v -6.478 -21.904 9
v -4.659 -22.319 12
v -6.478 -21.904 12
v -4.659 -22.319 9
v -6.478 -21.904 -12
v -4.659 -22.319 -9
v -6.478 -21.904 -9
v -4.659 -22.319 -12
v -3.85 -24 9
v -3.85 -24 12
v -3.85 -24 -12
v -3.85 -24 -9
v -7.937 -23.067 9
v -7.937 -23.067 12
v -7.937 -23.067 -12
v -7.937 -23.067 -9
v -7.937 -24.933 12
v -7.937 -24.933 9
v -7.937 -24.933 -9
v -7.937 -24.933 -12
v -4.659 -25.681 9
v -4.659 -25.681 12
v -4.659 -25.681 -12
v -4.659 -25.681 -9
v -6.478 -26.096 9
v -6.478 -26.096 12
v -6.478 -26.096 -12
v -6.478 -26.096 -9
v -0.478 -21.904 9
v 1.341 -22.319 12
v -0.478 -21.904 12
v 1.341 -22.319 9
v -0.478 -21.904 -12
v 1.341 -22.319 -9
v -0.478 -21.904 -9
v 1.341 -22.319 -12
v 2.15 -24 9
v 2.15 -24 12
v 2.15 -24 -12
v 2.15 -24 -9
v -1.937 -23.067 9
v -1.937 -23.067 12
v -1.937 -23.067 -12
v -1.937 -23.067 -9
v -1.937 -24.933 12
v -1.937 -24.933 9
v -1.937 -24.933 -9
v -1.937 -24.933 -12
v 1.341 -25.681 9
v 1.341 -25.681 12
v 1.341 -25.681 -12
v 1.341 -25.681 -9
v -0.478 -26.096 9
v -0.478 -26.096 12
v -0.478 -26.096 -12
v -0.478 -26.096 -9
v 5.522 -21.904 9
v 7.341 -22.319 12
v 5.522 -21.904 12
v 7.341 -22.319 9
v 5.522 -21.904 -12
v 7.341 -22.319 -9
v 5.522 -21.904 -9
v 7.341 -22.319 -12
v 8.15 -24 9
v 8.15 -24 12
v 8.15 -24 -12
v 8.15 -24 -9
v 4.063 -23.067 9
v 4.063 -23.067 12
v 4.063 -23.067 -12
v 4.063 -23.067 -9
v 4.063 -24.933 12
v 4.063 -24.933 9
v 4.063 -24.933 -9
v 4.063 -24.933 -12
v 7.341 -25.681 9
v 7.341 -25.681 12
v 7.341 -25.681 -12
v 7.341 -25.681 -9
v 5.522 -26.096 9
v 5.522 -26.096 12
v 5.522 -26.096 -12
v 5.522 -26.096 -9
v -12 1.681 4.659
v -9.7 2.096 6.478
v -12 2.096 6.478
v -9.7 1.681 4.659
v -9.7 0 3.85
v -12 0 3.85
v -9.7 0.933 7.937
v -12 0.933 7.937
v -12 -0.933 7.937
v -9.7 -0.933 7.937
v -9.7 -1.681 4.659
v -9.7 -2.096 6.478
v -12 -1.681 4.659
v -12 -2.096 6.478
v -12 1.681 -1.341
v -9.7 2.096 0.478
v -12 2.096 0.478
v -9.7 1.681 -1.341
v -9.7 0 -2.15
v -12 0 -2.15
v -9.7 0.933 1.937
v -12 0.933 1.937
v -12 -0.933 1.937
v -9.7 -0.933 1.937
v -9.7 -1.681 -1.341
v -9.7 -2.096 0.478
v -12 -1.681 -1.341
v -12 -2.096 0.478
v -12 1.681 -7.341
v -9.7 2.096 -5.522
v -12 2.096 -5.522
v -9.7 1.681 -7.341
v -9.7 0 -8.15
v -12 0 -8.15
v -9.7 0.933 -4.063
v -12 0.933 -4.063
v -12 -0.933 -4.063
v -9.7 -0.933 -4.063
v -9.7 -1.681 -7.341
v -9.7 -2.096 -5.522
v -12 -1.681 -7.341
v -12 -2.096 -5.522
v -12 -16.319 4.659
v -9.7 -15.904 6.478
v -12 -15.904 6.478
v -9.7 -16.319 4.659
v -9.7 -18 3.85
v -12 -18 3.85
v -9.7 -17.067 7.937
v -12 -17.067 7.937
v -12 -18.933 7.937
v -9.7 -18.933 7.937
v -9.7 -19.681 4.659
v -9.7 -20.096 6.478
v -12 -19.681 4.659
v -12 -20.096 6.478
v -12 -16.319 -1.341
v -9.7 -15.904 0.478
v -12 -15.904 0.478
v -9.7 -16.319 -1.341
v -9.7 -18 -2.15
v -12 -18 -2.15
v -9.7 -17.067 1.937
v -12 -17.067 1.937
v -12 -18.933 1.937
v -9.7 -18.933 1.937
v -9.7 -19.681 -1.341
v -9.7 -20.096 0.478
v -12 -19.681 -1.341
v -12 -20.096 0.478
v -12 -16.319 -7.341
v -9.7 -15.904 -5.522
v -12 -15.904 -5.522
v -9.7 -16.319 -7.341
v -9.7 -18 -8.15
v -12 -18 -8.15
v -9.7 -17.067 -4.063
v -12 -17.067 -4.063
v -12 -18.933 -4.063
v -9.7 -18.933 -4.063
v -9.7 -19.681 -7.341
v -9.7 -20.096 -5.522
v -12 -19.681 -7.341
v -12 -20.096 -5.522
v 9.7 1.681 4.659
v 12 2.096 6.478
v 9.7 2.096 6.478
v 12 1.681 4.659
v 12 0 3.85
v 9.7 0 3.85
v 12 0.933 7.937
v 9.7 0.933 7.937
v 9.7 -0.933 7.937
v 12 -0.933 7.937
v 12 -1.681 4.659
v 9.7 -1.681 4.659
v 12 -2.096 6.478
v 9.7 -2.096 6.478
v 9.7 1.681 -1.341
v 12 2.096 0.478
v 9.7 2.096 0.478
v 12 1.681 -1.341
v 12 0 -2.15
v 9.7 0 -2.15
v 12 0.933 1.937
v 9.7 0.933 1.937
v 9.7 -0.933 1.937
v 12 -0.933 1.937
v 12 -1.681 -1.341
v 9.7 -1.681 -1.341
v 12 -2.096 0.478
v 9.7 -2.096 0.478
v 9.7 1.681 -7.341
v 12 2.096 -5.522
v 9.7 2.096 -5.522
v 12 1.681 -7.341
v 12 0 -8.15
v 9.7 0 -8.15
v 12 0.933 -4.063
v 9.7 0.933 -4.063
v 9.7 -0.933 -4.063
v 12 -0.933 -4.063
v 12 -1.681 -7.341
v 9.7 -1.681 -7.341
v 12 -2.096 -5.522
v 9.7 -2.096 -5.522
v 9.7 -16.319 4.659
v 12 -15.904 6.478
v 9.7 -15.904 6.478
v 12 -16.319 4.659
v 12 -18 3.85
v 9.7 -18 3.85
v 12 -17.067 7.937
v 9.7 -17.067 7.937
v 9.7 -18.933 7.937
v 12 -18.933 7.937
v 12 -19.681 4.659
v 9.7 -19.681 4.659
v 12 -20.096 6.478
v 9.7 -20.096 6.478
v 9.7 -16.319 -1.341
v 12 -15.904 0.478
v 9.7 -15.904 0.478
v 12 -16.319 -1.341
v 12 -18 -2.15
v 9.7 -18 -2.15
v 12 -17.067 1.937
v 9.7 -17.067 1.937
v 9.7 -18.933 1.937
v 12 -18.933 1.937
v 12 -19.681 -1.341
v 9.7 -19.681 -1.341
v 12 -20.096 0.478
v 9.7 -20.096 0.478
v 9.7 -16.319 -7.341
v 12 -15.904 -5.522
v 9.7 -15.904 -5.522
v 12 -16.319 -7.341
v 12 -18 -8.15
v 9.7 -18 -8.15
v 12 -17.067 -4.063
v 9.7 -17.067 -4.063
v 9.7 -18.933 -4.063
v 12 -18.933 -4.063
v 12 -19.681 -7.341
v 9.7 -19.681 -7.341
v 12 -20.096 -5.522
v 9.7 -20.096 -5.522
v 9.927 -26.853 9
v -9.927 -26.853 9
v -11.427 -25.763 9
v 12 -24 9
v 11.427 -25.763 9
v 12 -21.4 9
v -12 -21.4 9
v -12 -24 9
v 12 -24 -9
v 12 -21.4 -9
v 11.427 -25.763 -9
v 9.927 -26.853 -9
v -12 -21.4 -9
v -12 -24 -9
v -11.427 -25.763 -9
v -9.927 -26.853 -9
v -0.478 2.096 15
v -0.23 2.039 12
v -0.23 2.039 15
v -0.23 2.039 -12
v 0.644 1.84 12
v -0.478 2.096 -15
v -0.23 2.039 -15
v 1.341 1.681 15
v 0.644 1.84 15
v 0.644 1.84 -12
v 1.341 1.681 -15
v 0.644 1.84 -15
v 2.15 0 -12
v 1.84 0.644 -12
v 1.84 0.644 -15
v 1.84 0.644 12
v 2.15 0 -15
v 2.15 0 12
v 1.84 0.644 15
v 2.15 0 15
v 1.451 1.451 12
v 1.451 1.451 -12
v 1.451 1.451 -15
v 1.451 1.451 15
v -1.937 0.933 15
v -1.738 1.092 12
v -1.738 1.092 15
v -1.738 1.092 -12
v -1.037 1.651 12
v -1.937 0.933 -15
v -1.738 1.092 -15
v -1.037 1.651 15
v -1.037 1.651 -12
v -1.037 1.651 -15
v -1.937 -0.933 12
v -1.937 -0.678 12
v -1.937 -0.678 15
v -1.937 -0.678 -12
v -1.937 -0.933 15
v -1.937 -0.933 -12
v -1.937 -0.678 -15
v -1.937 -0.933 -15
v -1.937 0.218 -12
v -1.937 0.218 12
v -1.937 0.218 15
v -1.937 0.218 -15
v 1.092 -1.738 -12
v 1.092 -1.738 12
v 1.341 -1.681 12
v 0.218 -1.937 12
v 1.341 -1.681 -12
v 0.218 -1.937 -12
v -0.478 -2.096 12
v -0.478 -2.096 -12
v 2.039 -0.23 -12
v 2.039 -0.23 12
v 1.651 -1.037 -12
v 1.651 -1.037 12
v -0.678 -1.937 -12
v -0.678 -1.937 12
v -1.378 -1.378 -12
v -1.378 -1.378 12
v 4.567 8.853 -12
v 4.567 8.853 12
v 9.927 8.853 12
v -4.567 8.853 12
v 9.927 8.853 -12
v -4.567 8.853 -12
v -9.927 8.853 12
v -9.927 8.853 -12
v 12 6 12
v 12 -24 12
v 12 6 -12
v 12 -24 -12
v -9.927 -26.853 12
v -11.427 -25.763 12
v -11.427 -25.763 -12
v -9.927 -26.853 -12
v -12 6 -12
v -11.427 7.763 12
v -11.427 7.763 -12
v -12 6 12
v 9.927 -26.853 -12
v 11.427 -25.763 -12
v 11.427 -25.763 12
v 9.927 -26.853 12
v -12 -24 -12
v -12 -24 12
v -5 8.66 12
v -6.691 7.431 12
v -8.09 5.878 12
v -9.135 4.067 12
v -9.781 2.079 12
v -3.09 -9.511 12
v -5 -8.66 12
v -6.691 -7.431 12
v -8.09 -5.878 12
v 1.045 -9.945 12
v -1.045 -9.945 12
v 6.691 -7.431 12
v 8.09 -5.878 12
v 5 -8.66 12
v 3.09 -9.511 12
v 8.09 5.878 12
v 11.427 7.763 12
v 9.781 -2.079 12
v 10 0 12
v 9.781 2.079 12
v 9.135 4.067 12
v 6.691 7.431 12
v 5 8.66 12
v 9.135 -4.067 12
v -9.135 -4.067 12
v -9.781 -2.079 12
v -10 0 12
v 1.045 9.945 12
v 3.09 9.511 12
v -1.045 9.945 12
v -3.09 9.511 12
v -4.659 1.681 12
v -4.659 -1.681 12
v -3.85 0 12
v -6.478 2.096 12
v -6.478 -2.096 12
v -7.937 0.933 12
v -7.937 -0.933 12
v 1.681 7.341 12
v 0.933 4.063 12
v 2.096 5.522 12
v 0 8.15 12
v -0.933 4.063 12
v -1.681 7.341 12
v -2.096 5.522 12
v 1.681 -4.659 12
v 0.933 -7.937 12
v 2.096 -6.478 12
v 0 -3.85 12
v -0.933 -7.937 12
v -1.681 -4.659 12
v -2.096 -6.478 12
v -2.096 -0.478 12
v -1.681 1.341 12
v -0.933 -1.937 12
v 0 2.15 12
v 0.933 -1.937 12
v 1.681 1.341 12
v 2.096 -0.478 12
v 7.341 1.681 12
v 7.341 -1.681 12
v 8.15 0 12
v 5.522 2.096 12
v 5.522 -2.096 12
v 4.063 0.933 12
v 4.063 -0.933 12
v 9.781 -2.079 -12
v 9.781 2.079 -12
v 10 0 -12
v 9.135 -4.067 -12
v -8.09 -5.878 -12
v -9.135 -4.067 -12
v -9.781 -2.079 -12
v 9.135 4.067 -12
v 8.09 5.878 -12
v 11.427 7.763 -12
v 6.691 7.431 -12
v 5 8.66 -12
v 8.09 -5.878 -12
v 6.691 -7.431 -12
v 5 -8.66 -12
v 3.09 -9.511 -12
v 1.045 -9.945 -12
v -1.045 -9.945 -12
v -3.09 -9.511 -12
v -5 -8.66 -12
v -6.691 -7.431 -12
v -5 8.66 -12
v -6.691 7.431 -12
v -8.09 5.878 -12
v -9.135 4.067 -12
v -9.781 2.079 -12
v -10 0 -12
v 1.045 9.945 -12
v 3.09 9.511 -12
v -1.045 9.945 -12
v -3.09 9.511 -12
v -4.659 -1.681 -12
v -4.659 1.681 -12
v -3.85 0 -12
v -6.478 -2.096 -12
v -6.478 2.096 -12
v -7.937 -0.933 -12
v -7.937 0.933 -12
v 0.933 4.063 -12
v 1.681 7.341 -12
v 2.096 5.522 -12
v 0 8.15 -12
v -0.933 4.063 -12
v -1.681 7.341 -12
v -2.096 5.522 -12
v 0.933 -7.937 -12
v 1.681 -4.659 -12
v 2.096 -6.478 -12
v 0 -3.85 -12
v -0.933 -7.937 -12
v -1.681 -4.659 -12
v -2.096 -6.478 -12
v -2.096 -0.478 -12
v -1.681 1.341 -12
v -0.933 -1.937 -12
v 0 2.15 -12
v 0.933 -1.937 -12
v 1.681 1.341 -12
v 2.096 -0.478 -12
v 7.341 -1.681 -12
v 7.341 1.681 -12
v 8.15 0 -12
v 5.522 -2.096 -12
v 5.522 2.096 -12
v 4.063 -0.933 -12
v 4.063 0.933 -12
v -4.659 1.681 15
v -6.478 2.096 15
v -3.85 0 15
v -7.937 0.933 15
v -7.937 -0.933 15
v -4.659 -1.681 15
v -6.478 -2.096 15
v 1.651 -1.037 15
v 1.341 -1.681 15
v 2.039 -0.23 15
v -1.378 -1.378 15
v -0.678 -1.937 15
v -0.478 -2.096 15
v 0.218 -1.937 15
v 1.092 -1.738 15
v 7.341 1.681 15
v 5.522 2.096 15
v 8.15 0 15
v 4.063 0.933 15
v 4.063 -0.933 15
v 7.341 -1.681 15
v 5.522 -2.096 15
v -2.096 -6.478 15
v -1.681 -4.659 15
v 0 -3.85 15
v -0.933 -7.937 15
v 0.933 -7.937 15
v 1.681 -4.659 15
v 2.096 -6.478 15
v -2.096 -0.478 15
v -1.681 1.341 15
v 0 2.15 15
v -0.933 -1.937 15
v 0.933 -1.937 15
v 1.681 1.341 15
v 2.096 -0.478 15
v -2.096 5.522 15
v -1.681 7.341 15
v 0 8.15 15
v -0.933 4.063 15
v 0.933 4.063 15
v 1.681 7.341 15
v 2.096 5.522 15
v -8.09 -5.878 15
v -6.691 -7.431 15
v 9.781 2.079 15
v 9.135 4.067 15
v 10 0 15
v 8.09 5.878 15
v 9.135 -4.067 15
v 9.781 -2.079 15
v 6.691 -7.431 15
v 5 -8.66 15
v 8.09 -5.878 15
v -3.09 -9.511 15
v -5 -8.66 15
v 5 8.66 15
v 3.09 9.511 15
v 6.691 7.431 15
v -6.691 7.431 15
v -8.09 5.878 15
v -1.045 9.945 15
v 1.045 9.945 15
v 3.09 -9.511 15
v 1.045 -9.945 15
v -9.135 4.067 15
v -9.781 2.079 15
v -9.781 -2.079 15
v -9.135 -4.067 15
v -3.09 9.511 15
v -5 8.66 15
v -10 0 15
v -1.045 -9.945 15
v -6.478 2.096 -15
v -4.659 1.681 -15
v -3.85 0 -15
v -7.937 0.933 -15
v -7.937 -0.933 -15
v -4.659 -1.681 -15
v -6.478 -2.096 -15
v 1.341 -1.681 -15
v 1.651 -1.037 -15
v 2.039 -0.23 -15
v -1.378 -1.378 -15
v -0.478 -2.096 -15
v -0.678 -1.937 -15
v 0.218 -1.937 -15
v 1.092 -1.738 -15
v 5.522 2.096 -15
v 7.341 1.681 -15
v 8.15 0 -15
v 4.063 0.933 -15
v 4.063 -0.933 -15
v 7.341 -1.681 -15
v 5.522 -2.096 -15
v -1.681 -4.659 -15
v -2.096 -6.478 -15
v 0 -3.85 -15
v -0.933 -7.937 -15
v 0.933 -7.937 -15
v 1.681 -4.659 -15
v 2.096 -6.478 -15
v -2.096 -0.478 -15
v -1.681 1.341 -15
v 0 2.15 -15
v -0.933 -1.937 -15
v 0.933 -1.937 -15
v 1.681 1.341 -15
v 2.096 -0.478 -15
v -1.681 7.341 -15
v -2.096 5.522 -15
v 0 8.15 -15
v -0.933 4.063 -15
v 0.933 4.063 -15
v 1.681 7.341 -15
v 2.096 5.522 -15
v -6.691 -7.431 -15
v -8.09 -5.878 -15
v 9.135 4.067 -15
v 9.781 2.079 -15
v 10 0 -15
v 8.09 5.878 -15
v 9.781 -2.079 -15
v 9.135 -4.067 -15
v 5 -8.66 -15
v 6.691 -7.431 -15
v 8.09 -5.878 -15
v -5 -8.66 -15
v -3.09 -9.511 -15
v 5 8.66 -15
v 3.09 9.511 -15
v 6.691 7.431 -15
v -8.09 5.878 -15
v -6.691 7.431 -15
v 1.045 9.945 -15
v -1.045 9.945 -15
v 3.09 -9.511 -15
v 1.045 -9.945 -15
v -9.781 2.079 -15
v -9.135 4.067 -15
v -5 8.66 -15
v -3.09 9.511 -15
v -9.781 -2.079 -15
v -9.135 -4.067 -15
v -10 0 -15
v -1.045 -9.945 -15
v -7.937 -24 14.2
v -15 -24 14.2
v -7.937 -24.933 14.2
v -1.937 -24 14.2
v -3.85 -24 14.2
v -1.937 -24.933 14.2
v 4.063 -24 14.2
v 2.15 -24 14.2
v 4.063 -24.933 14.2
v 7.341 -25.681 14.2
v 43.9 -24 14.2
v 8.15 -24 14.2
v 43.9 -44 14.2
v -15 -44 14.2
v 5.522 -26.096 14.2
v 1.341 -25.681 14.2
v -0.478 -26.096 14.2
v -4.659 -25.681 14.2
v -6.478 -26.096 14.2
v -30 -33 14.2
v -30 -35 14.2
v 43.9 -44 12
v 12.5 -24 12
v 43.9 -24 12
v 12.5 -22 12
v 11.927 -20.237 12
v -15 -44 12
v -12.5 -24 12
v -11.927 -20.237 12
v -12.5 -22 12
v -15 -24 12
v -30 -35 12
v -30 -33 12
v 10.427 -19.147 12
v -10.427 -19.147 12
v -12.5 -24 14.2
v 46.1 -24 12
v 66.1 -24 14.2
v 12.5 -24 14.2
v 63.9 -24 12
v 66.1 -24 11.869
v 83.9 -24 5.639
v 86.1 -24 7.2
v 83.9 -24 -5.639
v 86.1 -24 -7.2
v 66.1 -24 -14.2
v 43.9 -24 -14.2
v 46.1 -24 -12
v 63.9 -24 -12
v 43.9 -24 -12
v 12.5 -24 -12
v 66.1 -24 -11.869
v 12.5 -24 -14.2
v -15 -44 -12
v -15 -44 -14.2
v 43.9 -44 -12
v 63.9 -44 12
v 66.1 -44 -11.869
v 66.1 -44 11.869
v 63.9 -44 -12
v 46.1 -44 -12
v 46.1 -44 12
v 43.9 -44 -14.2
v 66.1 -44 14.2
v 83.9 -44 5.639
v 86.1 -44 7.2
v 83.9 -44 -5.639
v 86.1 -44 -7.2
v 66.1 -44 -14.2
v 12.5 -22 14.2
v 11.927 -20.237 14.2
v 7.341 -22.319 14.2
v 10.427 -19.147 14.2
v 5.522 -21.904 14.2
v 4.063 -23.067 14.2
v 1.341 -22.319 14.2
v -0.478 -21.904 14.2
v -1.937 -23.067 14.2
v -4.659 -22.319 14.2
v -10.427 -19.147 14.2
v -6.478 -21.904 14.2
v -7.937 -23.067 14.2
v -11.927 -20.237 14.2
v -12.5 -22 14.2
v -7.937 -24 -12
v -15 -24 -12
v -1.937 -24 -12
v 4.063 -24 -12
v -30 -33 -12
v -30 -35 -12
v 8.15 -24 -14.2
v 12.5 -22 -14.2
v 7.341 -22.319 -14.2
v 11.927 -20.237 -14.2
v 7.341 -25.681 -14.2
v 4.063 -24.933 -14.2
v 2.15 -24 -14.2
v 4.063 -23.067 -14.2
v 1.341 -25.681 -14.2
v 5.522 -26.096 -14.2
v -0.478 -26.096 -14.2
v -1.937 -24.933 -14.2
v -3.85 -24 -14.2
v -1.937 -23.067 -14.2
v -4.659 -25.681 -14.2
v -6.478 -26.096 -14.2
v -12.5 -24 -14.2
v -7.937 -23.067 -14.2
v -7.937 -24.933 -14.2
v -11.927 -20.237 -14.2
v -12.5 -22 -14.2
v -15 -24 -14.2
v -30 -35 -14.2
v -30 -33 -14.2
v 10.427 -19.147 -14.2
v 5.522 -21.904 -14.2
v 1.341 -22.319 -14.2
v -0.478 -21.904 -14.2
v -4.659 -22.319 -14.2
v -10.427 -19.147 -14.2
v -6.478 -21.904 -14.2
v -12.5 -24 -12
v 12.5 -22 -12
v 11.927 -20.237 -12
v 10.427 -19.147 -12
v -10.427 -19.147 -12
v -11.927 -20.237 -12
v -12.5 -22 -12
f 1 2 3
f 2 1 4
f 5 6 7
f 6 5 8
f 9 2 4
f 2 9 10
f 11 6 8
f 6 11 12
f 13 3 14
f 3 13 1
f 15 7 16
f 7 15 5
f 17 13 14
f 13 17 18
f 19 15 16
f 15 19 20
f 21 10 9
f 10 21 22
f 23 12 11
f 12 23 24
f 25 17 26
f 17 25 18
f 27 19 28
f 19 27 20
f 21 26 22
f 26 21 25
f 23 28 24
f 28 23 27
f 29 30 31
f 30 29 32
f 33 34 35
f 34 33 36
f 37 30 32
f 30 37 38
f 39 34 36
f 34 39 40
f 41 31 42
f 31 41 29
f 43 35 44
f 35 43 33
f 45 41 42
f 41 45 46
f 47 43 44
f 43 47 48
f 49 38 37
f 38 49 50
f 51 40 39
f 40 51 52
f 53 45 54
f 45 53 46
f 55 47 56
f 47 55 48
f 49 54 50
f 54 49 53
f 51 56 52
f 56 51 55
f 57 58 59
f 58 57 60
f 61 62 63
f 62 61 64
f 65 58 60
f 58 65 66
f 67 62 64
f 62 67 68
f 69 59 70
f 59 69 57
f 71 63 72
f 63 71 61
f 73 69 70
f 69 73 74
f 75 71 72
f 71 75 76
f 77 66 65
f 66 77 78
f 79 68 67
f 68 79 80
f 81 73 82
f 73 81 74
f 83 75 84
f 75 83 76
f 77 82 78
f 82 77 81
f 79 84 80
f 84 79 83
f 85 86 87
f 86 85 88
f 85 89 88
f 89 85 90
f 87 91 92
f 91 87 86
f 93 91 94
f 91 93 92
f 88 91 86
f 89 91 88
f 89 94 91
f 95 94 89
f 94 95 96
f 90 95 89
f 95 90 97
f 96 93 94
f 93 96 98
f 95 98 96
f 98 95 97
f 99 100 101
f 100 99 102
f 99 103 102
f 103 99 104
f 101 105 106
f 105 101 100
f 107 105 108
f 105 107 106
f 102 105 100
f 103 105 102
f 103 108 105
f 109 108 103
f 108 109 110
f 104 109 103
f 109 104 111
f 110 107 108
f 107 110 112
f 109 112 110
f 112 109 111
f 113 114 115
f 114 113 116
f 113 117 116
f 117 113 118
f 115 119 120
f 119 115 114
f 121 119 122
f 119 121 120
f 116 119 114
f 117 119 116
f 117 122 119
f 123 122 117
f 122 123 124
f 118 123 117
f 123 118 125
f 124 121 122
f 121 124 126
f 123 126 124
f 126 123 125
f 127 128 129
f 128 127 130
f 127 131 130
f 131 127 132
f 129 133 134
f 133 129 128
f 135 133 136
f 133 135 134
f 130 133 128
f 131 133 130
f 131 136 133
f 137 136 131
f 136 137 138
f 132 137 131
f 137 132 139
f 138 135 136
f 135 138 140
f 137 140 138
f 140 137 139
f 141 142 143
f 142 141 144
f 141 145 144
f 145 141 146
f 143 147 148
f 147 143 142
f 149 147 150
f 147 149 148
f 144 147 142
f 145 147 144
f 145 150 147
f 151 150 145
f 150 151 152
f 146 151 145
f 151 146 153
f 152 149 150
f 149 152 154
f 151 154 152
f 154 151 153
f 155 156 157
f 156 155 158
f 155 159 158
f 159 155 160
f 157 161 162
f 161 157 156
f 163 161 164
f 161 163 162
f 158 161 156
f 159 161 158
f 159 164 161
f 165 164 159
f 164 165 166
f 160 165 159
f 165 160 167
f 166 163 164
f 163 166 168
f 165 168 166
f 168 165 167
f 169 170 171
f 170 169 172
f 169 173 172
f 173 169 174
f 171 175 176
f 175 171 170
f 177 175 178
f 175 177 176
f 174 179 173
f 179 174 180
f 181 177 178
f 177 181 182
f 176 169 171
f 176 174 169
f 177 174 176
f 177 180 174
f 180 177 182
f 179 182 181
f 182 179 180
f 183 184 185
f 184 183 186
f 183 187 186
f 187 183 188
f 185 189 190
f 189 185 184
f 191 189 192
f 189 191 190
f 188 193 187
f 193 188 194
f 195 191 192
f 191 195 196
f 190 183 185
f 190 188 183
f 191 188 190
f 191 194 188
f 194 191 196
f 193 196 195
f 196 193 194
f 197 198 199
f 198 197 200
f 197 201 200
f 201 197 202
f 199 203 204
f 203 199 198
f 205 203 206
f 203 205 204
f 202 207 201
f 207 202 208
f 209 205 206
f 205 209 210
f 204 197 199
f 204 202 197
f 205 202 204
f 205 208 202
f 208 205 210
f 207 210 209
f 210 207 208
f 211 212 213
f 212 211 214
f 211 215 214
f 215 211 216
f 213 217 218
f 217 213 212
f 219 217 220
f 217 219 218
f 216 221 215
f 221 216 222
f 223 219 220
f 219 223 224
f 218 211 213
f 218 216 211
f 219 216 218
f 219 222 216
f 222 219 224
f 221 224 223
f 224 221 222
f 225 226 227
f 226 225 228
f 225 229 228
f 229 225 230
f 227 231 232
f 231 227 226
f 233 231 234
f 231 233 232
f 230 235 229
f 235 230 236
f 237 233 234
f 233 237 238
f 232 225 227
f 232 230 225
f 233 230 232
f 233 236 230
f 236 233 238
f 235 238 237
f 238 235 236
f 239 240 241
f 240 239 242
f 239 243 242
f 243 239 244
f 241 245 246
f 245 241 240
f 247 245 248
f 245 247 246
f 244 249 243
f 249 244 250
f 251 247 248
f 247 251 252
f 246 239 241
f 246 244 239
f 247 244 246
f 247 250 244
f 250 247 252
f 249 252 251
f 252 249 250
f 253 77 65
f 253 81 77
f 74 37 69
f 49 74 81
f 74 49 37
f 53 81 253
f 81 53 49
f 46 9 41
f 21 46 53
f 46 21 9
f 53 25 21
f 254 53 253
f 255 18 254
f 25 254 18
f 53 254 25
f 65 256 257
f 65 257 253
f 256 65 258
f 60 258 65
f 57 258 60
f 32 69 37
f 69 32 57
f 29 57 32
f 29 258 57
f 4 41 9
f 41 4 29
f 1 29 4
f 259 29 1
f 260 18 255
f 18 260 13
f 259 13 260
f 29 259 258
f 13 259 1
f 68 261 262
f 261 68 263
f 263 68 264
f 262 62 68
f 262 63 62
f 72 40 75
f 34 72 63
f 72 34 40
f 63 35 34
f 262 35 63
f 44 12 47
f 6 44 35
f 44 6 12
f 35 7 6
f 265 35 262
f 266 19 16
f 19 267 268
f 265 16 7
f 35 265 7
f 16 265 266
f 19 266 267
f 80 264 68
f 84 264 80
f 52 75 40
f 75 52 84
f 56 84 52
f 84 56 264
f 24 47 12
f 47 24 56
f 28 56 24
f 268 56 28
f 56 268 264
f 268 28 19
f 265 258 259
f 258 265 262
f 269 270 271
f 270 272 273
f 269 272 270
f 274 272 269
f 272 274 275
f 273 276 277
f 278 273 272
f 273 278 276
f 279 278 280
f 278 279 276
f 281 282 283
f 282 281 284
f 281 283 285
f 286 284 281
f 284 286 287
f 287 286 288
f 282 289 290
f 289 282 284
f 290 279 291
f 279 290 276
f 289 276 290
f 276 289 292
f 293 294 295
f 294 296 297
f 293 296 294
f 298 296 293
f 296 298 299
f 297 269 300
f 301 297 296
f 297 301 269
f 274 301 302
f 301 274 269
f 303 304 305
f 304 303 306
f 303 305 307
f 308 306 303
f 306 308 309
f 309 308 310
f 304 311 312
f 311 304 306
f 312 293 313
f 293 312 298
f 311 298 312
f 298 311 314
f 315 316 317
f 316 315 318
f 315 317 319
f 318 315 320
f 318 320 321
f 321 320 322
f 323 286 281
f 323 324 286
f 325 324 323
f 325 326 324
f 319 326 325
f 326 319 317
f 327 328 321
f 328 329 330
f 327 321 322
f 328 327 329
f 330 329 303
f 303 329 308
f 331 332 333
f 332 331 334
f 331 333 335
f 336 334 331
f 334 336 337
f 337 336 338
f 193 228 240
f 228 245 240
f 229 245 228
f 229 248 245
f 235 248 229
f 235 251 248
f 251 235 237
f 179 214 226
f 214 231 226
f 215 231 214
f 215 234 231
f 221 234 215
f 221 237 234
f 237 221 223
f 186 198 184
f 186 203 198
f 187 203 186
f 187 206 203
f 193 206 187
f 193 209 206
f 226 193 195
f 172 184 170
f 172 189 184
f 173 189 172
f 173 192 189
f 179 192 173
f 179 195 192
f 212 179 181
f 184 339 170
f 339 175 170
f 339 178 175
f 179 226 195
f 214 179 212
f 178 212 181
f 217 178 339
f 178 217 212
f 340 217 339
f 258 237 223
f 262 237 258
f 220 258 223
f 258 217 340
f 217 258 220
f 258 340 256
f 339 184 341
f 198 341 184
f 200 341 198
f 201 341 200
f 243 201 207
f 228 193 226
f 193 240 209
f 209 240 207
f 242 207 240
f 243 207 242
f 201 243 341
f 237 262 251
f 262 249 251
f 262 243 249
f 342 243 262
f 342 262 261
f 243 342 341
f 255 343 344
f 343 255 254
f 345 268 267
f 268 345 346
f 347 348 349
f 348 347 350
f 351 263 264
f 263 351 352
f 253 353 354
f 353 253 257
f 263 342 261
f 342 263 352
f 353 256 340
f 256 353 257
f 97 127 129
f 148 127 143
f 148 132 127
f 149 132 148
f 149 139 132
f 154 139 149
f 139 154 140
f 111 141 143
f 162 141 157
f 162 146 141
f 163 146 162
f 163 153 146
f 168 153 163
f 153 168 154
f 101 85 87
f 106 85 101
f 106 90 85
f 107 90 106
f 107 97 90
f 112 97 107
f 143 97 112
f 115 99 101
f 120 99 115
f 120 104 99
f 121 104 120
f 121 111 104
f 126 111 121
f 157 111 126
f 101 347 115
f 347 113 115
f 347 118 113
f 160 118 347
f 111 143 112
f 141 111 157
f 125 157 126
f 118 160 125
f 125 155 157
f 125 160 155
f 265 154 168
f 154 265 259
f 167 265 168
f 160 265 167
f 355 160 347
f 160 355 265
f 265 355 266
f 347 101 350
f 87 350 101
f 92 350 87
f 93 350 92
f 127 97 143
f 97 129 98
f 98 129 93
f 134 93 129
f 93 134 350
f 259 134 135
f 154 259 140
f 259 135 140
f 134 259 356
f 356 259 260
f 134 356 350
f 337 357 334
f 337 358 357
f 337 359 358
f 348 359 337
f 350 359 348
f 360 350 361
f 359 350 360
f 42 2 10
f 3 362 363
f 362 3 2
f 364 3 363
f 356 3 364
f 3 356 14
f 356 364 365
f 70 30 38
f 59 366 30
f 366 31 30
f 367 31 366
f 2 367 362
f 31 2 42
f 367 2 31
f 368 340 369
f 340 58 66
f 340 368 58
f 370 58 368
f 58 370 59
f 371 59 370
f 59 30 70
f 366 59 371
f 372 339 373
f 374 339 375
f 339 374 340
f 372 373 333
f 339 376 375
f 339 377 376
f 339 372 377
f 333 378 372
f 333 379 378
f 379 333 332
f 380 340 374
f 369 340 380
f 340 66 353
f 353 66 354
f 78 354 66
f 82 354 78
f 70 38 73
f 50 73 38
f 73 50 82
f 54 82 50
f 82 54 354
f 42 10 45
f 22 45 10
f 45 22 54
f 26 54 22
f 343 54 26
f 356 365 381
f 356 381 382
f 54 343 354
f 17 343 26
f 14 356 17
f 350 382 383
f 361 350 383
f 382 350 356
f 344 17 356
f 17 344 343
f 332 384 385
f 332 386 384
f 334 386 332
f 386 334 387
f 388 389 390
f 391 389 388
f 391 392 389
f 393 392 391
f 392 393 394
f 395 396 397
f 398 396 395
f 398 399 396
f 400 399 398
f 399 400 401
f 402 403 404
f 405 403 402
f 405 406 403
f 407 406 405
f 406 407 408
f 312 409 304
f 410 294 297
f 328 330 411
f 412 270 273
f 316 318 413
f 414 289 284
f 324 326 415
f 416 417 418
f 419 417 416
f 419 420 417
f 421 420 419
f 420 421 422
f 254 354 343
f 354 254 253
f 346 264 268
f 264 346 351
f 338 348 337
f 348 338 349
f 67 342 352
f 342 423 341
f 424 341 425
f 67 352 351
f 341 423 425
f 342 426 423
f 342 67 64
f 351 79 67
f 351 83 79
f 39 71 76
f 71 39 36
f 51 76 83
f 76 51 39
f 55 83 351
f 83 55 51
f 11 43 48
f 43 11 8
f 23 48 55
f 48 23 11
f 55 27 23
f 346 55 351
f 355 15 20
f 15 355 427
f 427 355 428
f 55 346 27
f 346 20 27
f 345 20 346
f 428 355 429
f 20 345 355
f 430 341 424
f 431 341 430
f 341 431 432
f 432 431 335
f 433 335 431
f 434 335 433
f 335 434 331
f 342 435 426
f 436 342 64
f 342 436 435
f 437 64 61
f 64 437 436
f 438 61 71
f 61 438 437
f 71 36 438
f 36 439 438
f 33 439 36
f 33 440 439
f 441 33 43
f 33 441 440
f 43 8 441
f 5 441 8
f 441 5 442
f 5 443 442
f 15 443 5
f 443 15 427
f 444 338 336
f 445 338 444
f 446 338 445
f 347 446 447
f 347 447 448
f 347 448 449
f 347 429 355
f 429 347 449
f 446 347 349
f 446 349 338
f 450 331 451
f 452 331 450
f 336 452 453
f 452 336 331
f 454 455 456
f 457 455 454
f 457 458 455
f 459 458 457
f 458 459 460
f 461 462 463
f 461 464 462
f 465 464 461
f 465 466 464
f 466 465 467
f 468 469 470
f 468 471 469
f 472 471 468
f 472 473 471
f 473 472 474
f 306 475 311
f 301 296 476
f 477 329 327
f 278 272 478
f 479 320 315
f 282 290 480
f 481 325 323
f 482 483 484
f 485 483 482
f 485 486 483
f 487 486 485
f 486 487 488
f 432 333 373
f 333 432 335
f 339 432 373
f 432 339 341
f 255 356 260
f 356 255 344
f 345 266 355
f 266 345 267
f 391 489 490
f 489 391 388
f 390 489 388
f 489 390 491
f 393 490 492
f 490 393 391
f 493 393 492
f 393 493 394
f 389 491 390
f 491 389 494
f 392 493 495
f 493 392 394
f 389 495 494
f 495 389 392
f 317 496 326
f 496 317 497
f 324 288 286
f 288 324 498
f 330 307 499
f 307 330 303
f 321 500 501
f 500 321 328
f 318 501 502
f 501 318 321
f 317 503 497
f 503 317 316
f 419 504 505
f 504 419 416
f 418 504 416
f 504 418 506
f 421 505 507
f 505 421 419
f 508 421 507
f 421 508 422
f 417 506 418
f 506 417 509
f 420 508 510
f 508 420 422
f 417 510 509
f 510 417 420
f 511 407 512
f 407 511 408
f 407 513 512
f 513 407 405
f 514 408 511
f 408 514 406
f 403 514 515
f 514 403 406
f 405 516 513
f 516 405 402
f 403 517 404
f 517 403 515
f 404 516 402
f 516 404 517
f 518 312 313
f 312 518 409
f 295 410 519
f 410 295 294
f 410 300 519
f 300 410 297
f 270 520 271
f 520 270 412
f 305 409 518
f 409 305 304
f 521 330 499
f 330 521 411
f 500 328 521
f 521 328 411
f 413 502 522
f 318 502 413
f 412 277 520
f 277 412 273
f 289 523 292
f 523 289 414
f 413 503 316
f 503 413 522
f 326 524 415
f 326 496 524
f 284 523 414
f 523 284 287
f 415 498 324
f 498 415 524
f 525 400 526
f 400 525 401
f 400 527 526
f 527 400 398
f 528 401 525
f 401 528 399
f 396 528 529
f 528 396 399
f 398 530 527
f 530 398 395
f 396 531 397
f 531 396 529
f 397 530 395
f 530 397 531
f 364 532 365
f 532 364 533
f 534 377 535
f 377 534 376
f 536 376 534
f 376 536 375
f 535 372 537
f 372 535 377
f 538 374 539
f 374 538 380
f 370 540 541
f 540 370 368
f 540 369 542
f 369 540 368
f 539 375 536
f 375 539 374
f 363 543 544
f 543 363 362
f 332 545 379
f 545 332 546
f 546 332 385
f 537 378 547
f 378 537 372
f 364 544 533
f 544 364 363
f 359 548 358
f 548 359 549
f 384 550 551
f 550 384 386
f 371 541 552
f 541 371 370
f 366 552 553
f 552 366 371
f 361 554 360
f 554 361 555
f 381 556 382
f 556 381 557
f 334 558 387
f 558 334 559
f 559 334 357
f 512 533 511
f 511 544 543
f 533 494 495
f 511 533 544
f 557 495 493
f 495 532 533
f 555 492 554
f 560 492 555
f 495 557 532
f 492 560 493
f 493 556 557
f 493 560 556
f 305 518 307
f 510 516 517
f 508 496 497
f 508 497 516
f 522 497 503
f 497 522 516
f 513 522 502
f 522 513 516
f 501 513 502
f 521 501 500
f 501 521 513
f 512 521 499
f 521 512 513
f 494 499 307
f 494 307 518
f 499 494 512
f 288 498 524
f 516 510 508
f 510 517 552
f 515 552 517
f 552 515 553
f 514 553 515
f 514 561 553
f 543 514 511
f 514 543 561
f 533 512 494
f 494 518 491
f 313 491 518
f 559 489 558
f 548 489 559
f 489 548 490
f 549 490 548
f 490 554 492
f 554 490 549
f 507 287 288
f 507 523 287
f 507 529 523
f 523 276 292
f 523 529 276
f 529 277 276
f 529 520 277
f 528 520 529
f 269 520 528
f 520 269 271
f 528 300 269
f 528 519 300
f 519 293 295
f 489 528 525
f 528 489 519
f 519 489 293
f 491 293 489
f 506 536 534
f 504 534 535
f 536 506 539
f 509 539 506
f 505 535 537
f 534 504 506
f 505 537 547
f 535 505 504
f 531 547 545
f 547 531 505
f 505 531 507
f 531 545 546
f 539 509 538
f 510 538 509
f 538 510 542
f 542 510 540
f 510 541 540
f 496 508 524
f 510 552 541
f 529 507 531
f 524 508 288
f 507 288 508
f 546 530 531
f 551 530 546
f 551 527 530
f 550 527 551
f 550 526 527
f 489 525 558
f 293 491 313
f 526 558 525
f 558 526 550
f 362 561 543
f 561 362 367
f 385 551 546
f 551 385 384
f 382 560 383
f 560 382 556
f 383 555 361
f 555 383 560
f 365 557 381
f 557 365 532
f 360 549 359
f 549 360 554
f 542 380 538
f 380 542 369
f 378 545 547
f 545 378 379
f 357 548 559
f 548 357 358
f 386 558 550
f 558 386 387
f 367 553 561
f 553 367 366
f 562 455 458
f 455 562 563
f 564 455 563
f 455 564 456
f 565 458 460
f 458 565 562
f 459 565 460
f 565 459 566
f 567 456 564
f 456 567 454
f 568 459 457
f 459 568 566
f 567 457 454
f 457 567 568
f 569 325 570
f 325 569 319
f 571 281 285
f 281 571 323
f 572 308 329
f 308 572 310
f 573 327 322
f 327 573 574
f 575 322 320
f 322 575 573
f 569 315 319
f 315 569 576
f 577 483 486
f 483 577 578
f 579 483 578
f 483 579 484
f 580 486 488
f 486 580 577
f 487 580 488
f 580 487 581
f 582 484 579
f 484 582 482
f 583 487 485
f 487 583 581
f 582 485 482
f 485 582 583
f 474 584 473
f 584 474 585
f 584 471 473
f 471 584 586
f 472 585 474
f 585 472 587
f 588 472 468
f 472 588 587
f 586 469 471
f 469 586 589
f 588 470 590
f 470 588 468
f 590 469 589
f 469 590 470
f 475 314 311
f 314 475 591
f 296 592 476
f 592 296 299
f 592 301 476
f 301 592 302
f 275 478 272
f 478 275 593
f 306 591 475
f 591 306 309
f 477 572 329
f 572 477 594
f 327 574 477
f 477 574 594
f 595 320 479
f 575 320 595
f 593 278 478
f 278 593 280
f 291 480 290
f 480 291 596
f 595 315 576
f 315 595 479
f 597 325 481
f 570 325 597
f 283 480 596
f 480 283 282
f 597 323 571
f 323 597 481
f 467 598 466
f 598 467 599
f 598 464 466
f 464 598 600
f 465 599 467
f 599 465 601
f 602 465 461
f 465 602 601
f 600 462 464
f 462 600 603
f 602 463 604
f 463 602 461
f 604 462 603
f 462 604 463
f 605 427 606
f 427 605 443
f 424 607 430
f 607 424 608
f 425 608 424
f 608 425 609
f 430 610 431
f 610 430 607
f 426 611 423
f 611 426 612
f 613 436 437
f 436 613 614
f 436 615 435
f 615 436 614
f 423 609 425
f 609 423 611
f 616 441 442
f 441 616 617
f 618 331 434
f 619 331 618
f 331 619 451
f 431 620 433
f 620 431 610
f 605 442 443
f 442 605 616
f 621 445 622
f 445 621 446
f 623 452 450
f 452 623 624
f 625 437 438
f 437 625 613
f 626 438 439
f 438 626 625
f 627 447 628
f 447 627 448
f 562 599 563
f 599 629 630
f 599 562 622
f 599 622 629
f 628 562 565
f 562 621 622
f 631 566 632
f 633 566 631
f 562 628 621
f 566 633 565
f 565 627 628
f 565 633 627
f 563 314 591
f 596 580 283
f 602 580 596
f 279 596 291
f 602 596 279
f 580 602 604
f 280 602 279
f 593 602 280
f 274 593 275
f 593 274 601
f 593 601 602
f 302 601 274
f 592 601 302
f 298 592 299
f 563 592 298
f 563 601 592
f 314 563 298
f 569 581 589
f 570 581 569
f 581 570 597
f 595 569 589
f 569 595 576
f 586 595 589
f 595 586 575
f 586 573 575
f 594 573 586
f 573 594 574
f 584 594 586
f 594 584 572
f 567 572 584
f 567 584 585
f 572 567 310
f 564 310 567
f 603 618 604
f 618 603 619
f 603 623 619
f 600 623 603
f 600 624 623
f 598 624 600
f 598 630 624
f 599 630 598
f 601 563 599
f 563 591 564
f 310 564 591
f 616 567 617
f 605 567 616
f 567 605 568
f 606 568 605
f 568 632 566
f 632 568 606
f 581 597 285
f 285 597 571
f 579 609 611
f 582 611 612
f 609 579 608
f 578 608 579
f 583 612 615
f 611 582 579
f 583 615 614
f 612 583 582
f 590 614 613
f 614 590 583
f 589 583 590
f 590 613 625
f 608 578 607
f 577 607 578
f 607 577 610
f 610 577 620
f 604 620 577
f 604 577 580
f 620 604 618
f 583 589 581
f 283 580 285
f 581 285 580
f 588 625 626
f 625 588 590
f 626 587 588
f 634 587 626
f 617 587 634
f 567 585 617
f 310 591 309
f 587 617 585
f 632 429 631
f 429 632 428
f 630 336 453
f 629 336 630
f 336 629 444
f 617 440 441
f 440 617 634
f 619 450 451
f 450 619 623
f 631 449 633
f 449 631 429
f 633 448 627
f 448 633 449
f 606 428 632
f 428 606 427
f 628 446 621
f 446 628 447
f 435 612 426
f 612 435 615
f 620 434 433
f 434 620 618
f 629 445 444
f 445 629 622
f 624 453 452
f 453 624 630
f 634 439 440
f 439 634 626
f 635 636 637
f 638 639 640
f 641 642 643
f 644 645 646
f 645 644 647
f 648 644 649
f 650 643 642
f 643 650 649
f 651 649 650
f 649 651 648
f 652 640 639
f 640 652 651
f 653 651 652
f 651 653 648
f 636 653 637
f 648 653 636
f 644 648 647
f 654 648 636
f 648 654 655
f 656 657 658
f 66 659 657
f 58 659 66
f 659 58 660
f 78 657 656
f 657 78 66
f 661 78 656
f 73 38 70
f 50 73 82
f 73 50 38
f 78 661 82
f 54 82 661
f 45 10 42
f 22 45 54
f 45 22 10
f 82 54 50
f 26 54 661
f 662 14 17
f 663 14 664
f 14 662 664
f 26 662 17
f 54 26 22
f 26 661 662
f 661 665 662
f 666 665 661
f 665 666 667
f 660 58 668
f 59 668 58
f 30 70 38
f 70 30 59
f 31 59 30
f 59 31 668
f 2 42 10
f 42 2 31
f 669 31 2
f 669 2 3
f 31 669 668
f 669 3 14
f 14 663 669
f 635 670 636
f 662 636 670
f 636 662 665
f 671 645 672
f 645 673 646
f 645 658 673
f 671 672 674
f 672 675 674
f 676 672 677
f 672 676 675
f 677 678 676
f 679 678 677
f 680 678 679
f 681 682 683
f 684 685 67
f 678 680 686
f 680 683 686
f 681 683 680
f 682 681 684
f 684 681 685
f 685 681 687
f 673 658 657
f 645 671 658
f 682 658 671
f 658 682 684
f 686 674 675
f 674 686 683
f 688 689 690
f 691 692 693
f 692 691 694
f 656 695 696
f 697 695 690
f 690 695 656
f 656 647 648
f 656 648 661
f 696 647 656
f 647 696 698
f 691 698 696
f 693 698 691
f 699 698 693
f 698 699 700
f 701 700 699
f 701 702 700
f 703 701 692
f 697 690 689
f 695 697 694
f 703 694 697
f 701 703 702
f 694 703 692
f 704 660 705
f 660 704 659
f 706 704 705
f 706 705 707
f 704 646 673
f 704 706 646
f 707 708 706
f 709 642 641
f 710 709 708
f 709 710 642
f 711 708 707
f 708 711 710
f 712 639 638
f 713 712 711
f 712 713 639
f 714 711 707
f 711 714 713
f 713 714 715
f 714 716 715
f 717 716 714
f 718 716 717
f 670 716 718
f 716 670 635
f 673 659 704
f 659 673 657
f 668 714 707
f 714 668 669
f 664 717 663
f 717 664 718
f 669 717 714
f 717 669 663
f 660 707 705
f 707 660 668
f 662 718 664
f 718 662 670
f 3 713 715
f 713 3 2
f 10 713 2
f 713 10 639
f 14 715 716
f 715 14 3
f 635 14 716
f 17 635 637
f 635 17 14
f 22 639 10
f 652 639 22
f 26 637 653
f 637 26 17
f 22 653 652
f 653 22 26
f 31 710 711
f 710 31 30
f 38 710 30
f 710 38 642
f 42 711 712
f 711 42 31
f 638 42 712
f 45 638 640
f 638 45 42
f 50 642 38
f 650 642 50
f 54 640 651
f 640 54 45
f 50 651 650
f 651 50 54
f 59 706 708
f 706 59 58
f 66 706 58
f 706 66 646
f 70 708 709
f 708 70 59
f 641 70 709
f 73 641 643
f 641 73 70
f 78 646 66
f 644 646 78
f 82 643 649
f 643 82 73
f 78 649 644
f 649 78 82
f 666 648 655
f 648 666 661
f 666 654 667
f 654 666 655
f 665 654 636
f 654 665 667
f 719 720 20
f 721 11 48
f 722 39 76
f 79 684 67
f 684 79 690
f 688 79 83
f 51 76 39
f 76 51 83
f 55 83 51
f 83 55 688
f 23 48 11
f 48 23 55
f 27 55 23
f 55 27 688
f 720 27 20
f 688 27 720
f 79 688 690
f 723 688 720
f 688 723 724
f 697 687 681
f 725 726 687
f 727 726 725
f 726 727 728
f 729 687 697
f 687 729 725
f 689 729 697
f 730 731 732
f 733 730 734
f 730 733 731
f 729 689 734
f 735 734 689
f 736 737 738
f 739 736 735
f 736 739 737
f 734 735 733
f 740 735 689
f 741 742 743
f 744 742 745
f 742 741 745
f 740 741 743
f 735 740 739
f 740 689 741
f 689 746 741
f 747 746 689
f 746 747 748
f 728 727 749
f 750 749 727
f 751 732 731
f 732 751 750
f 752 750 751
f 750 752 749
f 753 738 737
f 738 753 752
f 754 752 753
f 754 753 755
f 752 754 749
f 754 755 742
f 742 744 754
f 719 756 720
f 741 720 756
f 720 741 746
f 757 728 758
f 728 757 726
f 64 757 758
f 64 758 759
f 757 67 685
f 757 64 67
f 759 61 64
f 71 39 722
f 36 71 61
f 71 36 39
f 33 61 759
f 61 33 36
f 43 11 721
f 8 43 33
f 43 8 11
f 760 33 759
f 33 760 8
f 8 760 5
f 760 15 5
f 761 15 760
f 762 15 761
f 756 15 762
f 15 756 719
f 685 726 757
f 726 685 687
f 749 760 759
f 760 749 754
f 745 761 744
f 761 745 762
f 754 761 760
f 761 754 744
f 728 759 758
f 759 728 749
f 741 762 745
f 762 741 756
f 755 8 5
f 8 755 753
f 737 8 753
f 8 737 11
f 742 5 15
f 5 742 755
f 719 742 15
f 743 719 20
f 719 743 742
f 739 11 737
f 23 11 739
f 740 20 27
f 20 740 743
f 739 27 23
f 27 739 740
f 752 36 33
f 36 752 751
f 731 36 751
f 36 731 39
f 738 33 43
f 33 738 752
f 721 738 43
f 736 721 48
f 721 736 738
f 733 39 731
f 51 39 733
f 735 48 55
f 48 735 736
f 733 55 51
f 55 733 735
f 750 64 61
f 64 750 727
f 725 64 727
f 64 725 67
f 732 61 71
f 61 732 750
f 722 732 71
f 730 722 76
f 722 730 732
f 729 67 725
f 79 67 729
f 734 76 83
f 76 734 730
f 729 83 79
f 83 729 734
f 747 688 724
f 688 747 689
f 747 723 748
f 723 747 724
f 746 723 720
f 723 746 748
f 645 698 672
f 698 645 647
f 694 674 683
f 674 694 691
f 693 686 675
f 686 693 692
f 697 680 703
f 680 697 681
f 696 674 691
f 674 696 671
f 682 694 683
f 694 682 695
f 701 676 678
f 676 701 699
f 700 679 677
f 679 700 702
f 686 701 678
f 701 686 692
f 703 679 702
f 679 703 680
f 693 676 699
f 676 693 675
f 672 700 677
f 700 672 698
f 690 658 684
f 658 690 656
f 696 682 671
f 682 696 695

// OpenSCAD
// file: ../models/motor_values.scad
// Motor dimensions
MotorWidth = 24; 
MotorHeight = 36; 
MotorDepth = 24; 
MotorArmOffset = 9;
// file: ../models/arm.scad
Collisions=false;
include <ollo.scad>;

module arm_pulley(pulley=false)
{
	c = pulley?[0.6,0.6,0.6]:[0.2,0.2,0.2];
    if (!Collisions) {
	    color(c) {
		difference() {
		    cylinder(d=20, h=OlloWidth);
		    servoArm(OlloWidth);
		}
	    }
    }
}

//:Model "Arm" [0.1,0.1,0.1]
module arm(pulley=false) {
    arm_pulley();
}

//:Model "Pulley" [0.6,0.6,0.6]
module pulley() {
    //:BOM "Ollo pulley" 0.2 http://www.robotis-shop-en.com/?act=shop_en.goods_view&GS=1590
    arm_pulley(true);
}

arm();
// file: ../models/motor.scad
Collisions=false;
include <ollo.scad>;
include <motor_values.scad>;
use <../util/rounded.scad>;

//:Model "Motor" [0.4,0.45,0.4]
module motor(thickness=2.2) {
    //:BOM "XL-320 Servo" 21.9 http://www.robotis-shop-en.com/?act=shop_en.goods_view&GS=1611
    translate([0,-MotorArmOffset,-MotorDepth/2]) {
        color([0.25,0.25,0.25]) {
            difference() {
                rounded(MotorWidth,MotorHeight,MotorDepth,3,center=true);

		if (!Collisions) {
			// Bottom
			translate([-MotorWidth/2-0.1,-MotorHeight/2-0.1,3])
			    cube([MotorWidth+0.2, 5.7, MotorDepth-6]);

			translate([0,-MotorHeight/2+3])
			    threeOllo(MotorDepth);

			// Motor shaft
			translate([0, MotorArmOffset])
			    olloHole(MotorDepth+5);

			// Side holes
			for (side=[-MotorWidth/2,MotorWidth/2-thickness]) {
			    translate([side,9,MotorDepth/2]) {
				rotate([0,90,0]) {
				    threeOllo();
				    translate([0,-3*OlloSpacing,0])
					threeOllo();
				}
			    }
			}
		}
            }
        }
    }
}

motor();
// file: ../util/rounded.scad
Collisions=false;

// Do a rounded cube
module rounded(x=10, y=10, z=10, r=3, center=false) {
    if (Collisions) {
        translate([0,0,center?(z/2):0])
            cube([x,y,z], center=center);
    } else {
        if (center) {
            translate([-(x/2),-(y/2),0])
                rounded(x, y, z, r);
        } else {
            translate([r,r,0])
                minkowski() {
                    cube([x-2*r,y-2*r,z/2]);
                    cylinder(h=z/2, r=r);
                }
        }
    }
}
// file: ../models/ollo.scad
Collisions=false;

// Diameter of plastic ollo holes
OlloHoles = 4.3;

// Width of Ollo "real" plastic
OlloWidth = 3;

// Distance between two ollo holes
OlloSpacing = 6;

// Do an Ollo hole on the part
module olloHole(depth=2.2)
{
    if (!Collisions) {
        //:BOM "Ollo rivet" 0.05 http://www.robotis-shop-en.com/?act=shop_en.goods_view&GS=1605
        translate([0,0,-0.1])
            cylinder(depth+0.2, OlloHoles/2, OlloHoles/2);
    }	    
}

// Do 3 ollo holes
module threeOllo(depth=2.2)
{
    for (xy=[[-OlloSpacing,0],[0,0],[OlloSpacing,0]]) {
        translate([xy[0], xy[1], 0])
            olloHole(depth);
    }
}

// Do a servo arm holes
module servoArm(depth=2.2)
{
    threeOllo(depth);
    rotate([0,0,90])
        threeOllo(depth);
}
// file: ../models/motor_arm.scad
include <motor.scad>;
use <arm.scad>;

module motorArm(counterArm=true) {
    motor();
    translate([0,0,MotorDepth/2])
        arm();
    if (counterArm) {
        translate([0,0,-MotorDepth/2-OlloWidth]) {
            pulley();
        }
    }
}

motorArm();
// file: ../parts/leg.scad
Collisions=false;
use <../models/ollo.scad>;
use <../util/rounded.scad>;

//:Part
module leg(sizeA=60, sizeB=20, sizeC=20, sizeBottom=10,
        sizeTop=15, mode="arm", fixationAngle=0, thickness=2.2, print=false)
{
    xOffset = (mode == "side") ? -10 : 0;
    spacing = (mode == "side") ? 24 : 30;

    module legSide()
    {
        difference() {
            union() {
                translate([0,0,sizeA/2])
                    rotate([0,90,0]) {
                        cube([sizeA, 20, thickness], center=true);
                        if (mode == "side") {
                            translate([15-sizeA/2, 10, -thickness/2])
                                rotate([0,0,+fixationAngle])
                                rounded(25,10,thickness, center=true);
                        }
                    }
            }
            translate([-thickness, 0, sizeA-15]) {
                rotate([90,0,90]) {
                    if (mode == "arm") {
                        servoArm(2*thickness);
                    }
                }
                if (mode == "side") {
                    translate([0,10,0])
                        rotate([90,90-fixationAngle,90])
                        threeOllo(2*thickness);
                }
            }
        }
	if (Collisions) {
		translate([0,0,sizeA+sizeTop-10]) {
			rotate([45,0,0])
			rotate([0,-90,0])
			cube([14,14,thickness],center=true);
		}
	} else {
		translate([-thickness/2,0,sizeA]) {
		    rotate([90,0,90])
			linear_extrude(thickness)
			polygon([[-10,0],[-1,sizeTop],[1,sizeTop],[10,0]]);
		}
	}
    }

    module biais() {
        Dx = (spacing-sizeBottom)/2;
        Dy = sizeC;
        Dl = sqrt(pow(Dx,2)+pow(Dy,2));

        translate([-(spacing/2)-thickness,-10,-(sizeB+thickness/2)])
            rotate([0,atan2(Dy,Dx),0])
            cube([Dl,20,thickness]);
    }

    if (print) {
        translate([0,0,10-xOffset])
            rotate([90,0,0])
            leg(sizeA, sizeB, sizeC, sizeBottom,
                    sizeTop, mode, fixationAngle, thickness, false);
    } else {
        translate([0,xOffset,-sizeA+15]) {
            cube([spacing+thickness*2, 20, thickness], center=true);

            translate([spacing/2+thickness/2,0,0])
                legSide();
            translate([-(spacing/2+thickness/2),0,0])
                legSide();

		if (!Collisions) {
		    translate([0,0,-sizeB])
			cube([spacing+thickness*2, 20, thickness], center=true);
		    translate([spacing/2+thickness/2,0,-sizeB/2])
			cube([thickness,20,sizeB], center=true);
		    translate([-(spacing/2+thickness/2),0,-sizeB/2])
			cube([thickness,20,sizeB], center=true);

		    translate([0,0,-(sizeB+sizeC)])
			cube([sizeBottom+thickness*2, 20, thickness], center=true);

		    biais();
		    mirror([1,0,0])
			biais();
		} else {
		    translate([0,0,-(sizeB+sizeC+thickness)+20])
			sphere(20);  
		}
        }
    }
}

leg();
// main file
use <../parts/leg.scad>;
use <../models/motor_arm.scad>;

//:Component "Bottom leg"
//:Description "Leg on motor bottom"
//:Parameter SizeA "Size of the first part"
//:Parameter SizeB "Size of the second part"
//:Parameter SizeC "Size of the third part"
//:Parameter SizeBottom "Size of the bottom"
//:Parameter SizeTop "Size of the top"
//:Parameter FixationAngle "Fixation angle"
//:Parameter Thickness "Thickness of the part"
module bottom_leg(SizeA=60, SizeB=20, SizeC=20, SizeBottom=10,
        SizeTop=15, FixationAngle=0, Thickness=2.2)
{
    //:Anchor motor male
    motorArm();

    translate([0,-(24),0]) {
    rotate([0,-90,FixationAngle]) {
	leg(SizeA, SizeB, SizeC, SizeBottom, SizeTop, "side", FixationAngle, Thickness);
    }
    }
}

bottom_leg();
